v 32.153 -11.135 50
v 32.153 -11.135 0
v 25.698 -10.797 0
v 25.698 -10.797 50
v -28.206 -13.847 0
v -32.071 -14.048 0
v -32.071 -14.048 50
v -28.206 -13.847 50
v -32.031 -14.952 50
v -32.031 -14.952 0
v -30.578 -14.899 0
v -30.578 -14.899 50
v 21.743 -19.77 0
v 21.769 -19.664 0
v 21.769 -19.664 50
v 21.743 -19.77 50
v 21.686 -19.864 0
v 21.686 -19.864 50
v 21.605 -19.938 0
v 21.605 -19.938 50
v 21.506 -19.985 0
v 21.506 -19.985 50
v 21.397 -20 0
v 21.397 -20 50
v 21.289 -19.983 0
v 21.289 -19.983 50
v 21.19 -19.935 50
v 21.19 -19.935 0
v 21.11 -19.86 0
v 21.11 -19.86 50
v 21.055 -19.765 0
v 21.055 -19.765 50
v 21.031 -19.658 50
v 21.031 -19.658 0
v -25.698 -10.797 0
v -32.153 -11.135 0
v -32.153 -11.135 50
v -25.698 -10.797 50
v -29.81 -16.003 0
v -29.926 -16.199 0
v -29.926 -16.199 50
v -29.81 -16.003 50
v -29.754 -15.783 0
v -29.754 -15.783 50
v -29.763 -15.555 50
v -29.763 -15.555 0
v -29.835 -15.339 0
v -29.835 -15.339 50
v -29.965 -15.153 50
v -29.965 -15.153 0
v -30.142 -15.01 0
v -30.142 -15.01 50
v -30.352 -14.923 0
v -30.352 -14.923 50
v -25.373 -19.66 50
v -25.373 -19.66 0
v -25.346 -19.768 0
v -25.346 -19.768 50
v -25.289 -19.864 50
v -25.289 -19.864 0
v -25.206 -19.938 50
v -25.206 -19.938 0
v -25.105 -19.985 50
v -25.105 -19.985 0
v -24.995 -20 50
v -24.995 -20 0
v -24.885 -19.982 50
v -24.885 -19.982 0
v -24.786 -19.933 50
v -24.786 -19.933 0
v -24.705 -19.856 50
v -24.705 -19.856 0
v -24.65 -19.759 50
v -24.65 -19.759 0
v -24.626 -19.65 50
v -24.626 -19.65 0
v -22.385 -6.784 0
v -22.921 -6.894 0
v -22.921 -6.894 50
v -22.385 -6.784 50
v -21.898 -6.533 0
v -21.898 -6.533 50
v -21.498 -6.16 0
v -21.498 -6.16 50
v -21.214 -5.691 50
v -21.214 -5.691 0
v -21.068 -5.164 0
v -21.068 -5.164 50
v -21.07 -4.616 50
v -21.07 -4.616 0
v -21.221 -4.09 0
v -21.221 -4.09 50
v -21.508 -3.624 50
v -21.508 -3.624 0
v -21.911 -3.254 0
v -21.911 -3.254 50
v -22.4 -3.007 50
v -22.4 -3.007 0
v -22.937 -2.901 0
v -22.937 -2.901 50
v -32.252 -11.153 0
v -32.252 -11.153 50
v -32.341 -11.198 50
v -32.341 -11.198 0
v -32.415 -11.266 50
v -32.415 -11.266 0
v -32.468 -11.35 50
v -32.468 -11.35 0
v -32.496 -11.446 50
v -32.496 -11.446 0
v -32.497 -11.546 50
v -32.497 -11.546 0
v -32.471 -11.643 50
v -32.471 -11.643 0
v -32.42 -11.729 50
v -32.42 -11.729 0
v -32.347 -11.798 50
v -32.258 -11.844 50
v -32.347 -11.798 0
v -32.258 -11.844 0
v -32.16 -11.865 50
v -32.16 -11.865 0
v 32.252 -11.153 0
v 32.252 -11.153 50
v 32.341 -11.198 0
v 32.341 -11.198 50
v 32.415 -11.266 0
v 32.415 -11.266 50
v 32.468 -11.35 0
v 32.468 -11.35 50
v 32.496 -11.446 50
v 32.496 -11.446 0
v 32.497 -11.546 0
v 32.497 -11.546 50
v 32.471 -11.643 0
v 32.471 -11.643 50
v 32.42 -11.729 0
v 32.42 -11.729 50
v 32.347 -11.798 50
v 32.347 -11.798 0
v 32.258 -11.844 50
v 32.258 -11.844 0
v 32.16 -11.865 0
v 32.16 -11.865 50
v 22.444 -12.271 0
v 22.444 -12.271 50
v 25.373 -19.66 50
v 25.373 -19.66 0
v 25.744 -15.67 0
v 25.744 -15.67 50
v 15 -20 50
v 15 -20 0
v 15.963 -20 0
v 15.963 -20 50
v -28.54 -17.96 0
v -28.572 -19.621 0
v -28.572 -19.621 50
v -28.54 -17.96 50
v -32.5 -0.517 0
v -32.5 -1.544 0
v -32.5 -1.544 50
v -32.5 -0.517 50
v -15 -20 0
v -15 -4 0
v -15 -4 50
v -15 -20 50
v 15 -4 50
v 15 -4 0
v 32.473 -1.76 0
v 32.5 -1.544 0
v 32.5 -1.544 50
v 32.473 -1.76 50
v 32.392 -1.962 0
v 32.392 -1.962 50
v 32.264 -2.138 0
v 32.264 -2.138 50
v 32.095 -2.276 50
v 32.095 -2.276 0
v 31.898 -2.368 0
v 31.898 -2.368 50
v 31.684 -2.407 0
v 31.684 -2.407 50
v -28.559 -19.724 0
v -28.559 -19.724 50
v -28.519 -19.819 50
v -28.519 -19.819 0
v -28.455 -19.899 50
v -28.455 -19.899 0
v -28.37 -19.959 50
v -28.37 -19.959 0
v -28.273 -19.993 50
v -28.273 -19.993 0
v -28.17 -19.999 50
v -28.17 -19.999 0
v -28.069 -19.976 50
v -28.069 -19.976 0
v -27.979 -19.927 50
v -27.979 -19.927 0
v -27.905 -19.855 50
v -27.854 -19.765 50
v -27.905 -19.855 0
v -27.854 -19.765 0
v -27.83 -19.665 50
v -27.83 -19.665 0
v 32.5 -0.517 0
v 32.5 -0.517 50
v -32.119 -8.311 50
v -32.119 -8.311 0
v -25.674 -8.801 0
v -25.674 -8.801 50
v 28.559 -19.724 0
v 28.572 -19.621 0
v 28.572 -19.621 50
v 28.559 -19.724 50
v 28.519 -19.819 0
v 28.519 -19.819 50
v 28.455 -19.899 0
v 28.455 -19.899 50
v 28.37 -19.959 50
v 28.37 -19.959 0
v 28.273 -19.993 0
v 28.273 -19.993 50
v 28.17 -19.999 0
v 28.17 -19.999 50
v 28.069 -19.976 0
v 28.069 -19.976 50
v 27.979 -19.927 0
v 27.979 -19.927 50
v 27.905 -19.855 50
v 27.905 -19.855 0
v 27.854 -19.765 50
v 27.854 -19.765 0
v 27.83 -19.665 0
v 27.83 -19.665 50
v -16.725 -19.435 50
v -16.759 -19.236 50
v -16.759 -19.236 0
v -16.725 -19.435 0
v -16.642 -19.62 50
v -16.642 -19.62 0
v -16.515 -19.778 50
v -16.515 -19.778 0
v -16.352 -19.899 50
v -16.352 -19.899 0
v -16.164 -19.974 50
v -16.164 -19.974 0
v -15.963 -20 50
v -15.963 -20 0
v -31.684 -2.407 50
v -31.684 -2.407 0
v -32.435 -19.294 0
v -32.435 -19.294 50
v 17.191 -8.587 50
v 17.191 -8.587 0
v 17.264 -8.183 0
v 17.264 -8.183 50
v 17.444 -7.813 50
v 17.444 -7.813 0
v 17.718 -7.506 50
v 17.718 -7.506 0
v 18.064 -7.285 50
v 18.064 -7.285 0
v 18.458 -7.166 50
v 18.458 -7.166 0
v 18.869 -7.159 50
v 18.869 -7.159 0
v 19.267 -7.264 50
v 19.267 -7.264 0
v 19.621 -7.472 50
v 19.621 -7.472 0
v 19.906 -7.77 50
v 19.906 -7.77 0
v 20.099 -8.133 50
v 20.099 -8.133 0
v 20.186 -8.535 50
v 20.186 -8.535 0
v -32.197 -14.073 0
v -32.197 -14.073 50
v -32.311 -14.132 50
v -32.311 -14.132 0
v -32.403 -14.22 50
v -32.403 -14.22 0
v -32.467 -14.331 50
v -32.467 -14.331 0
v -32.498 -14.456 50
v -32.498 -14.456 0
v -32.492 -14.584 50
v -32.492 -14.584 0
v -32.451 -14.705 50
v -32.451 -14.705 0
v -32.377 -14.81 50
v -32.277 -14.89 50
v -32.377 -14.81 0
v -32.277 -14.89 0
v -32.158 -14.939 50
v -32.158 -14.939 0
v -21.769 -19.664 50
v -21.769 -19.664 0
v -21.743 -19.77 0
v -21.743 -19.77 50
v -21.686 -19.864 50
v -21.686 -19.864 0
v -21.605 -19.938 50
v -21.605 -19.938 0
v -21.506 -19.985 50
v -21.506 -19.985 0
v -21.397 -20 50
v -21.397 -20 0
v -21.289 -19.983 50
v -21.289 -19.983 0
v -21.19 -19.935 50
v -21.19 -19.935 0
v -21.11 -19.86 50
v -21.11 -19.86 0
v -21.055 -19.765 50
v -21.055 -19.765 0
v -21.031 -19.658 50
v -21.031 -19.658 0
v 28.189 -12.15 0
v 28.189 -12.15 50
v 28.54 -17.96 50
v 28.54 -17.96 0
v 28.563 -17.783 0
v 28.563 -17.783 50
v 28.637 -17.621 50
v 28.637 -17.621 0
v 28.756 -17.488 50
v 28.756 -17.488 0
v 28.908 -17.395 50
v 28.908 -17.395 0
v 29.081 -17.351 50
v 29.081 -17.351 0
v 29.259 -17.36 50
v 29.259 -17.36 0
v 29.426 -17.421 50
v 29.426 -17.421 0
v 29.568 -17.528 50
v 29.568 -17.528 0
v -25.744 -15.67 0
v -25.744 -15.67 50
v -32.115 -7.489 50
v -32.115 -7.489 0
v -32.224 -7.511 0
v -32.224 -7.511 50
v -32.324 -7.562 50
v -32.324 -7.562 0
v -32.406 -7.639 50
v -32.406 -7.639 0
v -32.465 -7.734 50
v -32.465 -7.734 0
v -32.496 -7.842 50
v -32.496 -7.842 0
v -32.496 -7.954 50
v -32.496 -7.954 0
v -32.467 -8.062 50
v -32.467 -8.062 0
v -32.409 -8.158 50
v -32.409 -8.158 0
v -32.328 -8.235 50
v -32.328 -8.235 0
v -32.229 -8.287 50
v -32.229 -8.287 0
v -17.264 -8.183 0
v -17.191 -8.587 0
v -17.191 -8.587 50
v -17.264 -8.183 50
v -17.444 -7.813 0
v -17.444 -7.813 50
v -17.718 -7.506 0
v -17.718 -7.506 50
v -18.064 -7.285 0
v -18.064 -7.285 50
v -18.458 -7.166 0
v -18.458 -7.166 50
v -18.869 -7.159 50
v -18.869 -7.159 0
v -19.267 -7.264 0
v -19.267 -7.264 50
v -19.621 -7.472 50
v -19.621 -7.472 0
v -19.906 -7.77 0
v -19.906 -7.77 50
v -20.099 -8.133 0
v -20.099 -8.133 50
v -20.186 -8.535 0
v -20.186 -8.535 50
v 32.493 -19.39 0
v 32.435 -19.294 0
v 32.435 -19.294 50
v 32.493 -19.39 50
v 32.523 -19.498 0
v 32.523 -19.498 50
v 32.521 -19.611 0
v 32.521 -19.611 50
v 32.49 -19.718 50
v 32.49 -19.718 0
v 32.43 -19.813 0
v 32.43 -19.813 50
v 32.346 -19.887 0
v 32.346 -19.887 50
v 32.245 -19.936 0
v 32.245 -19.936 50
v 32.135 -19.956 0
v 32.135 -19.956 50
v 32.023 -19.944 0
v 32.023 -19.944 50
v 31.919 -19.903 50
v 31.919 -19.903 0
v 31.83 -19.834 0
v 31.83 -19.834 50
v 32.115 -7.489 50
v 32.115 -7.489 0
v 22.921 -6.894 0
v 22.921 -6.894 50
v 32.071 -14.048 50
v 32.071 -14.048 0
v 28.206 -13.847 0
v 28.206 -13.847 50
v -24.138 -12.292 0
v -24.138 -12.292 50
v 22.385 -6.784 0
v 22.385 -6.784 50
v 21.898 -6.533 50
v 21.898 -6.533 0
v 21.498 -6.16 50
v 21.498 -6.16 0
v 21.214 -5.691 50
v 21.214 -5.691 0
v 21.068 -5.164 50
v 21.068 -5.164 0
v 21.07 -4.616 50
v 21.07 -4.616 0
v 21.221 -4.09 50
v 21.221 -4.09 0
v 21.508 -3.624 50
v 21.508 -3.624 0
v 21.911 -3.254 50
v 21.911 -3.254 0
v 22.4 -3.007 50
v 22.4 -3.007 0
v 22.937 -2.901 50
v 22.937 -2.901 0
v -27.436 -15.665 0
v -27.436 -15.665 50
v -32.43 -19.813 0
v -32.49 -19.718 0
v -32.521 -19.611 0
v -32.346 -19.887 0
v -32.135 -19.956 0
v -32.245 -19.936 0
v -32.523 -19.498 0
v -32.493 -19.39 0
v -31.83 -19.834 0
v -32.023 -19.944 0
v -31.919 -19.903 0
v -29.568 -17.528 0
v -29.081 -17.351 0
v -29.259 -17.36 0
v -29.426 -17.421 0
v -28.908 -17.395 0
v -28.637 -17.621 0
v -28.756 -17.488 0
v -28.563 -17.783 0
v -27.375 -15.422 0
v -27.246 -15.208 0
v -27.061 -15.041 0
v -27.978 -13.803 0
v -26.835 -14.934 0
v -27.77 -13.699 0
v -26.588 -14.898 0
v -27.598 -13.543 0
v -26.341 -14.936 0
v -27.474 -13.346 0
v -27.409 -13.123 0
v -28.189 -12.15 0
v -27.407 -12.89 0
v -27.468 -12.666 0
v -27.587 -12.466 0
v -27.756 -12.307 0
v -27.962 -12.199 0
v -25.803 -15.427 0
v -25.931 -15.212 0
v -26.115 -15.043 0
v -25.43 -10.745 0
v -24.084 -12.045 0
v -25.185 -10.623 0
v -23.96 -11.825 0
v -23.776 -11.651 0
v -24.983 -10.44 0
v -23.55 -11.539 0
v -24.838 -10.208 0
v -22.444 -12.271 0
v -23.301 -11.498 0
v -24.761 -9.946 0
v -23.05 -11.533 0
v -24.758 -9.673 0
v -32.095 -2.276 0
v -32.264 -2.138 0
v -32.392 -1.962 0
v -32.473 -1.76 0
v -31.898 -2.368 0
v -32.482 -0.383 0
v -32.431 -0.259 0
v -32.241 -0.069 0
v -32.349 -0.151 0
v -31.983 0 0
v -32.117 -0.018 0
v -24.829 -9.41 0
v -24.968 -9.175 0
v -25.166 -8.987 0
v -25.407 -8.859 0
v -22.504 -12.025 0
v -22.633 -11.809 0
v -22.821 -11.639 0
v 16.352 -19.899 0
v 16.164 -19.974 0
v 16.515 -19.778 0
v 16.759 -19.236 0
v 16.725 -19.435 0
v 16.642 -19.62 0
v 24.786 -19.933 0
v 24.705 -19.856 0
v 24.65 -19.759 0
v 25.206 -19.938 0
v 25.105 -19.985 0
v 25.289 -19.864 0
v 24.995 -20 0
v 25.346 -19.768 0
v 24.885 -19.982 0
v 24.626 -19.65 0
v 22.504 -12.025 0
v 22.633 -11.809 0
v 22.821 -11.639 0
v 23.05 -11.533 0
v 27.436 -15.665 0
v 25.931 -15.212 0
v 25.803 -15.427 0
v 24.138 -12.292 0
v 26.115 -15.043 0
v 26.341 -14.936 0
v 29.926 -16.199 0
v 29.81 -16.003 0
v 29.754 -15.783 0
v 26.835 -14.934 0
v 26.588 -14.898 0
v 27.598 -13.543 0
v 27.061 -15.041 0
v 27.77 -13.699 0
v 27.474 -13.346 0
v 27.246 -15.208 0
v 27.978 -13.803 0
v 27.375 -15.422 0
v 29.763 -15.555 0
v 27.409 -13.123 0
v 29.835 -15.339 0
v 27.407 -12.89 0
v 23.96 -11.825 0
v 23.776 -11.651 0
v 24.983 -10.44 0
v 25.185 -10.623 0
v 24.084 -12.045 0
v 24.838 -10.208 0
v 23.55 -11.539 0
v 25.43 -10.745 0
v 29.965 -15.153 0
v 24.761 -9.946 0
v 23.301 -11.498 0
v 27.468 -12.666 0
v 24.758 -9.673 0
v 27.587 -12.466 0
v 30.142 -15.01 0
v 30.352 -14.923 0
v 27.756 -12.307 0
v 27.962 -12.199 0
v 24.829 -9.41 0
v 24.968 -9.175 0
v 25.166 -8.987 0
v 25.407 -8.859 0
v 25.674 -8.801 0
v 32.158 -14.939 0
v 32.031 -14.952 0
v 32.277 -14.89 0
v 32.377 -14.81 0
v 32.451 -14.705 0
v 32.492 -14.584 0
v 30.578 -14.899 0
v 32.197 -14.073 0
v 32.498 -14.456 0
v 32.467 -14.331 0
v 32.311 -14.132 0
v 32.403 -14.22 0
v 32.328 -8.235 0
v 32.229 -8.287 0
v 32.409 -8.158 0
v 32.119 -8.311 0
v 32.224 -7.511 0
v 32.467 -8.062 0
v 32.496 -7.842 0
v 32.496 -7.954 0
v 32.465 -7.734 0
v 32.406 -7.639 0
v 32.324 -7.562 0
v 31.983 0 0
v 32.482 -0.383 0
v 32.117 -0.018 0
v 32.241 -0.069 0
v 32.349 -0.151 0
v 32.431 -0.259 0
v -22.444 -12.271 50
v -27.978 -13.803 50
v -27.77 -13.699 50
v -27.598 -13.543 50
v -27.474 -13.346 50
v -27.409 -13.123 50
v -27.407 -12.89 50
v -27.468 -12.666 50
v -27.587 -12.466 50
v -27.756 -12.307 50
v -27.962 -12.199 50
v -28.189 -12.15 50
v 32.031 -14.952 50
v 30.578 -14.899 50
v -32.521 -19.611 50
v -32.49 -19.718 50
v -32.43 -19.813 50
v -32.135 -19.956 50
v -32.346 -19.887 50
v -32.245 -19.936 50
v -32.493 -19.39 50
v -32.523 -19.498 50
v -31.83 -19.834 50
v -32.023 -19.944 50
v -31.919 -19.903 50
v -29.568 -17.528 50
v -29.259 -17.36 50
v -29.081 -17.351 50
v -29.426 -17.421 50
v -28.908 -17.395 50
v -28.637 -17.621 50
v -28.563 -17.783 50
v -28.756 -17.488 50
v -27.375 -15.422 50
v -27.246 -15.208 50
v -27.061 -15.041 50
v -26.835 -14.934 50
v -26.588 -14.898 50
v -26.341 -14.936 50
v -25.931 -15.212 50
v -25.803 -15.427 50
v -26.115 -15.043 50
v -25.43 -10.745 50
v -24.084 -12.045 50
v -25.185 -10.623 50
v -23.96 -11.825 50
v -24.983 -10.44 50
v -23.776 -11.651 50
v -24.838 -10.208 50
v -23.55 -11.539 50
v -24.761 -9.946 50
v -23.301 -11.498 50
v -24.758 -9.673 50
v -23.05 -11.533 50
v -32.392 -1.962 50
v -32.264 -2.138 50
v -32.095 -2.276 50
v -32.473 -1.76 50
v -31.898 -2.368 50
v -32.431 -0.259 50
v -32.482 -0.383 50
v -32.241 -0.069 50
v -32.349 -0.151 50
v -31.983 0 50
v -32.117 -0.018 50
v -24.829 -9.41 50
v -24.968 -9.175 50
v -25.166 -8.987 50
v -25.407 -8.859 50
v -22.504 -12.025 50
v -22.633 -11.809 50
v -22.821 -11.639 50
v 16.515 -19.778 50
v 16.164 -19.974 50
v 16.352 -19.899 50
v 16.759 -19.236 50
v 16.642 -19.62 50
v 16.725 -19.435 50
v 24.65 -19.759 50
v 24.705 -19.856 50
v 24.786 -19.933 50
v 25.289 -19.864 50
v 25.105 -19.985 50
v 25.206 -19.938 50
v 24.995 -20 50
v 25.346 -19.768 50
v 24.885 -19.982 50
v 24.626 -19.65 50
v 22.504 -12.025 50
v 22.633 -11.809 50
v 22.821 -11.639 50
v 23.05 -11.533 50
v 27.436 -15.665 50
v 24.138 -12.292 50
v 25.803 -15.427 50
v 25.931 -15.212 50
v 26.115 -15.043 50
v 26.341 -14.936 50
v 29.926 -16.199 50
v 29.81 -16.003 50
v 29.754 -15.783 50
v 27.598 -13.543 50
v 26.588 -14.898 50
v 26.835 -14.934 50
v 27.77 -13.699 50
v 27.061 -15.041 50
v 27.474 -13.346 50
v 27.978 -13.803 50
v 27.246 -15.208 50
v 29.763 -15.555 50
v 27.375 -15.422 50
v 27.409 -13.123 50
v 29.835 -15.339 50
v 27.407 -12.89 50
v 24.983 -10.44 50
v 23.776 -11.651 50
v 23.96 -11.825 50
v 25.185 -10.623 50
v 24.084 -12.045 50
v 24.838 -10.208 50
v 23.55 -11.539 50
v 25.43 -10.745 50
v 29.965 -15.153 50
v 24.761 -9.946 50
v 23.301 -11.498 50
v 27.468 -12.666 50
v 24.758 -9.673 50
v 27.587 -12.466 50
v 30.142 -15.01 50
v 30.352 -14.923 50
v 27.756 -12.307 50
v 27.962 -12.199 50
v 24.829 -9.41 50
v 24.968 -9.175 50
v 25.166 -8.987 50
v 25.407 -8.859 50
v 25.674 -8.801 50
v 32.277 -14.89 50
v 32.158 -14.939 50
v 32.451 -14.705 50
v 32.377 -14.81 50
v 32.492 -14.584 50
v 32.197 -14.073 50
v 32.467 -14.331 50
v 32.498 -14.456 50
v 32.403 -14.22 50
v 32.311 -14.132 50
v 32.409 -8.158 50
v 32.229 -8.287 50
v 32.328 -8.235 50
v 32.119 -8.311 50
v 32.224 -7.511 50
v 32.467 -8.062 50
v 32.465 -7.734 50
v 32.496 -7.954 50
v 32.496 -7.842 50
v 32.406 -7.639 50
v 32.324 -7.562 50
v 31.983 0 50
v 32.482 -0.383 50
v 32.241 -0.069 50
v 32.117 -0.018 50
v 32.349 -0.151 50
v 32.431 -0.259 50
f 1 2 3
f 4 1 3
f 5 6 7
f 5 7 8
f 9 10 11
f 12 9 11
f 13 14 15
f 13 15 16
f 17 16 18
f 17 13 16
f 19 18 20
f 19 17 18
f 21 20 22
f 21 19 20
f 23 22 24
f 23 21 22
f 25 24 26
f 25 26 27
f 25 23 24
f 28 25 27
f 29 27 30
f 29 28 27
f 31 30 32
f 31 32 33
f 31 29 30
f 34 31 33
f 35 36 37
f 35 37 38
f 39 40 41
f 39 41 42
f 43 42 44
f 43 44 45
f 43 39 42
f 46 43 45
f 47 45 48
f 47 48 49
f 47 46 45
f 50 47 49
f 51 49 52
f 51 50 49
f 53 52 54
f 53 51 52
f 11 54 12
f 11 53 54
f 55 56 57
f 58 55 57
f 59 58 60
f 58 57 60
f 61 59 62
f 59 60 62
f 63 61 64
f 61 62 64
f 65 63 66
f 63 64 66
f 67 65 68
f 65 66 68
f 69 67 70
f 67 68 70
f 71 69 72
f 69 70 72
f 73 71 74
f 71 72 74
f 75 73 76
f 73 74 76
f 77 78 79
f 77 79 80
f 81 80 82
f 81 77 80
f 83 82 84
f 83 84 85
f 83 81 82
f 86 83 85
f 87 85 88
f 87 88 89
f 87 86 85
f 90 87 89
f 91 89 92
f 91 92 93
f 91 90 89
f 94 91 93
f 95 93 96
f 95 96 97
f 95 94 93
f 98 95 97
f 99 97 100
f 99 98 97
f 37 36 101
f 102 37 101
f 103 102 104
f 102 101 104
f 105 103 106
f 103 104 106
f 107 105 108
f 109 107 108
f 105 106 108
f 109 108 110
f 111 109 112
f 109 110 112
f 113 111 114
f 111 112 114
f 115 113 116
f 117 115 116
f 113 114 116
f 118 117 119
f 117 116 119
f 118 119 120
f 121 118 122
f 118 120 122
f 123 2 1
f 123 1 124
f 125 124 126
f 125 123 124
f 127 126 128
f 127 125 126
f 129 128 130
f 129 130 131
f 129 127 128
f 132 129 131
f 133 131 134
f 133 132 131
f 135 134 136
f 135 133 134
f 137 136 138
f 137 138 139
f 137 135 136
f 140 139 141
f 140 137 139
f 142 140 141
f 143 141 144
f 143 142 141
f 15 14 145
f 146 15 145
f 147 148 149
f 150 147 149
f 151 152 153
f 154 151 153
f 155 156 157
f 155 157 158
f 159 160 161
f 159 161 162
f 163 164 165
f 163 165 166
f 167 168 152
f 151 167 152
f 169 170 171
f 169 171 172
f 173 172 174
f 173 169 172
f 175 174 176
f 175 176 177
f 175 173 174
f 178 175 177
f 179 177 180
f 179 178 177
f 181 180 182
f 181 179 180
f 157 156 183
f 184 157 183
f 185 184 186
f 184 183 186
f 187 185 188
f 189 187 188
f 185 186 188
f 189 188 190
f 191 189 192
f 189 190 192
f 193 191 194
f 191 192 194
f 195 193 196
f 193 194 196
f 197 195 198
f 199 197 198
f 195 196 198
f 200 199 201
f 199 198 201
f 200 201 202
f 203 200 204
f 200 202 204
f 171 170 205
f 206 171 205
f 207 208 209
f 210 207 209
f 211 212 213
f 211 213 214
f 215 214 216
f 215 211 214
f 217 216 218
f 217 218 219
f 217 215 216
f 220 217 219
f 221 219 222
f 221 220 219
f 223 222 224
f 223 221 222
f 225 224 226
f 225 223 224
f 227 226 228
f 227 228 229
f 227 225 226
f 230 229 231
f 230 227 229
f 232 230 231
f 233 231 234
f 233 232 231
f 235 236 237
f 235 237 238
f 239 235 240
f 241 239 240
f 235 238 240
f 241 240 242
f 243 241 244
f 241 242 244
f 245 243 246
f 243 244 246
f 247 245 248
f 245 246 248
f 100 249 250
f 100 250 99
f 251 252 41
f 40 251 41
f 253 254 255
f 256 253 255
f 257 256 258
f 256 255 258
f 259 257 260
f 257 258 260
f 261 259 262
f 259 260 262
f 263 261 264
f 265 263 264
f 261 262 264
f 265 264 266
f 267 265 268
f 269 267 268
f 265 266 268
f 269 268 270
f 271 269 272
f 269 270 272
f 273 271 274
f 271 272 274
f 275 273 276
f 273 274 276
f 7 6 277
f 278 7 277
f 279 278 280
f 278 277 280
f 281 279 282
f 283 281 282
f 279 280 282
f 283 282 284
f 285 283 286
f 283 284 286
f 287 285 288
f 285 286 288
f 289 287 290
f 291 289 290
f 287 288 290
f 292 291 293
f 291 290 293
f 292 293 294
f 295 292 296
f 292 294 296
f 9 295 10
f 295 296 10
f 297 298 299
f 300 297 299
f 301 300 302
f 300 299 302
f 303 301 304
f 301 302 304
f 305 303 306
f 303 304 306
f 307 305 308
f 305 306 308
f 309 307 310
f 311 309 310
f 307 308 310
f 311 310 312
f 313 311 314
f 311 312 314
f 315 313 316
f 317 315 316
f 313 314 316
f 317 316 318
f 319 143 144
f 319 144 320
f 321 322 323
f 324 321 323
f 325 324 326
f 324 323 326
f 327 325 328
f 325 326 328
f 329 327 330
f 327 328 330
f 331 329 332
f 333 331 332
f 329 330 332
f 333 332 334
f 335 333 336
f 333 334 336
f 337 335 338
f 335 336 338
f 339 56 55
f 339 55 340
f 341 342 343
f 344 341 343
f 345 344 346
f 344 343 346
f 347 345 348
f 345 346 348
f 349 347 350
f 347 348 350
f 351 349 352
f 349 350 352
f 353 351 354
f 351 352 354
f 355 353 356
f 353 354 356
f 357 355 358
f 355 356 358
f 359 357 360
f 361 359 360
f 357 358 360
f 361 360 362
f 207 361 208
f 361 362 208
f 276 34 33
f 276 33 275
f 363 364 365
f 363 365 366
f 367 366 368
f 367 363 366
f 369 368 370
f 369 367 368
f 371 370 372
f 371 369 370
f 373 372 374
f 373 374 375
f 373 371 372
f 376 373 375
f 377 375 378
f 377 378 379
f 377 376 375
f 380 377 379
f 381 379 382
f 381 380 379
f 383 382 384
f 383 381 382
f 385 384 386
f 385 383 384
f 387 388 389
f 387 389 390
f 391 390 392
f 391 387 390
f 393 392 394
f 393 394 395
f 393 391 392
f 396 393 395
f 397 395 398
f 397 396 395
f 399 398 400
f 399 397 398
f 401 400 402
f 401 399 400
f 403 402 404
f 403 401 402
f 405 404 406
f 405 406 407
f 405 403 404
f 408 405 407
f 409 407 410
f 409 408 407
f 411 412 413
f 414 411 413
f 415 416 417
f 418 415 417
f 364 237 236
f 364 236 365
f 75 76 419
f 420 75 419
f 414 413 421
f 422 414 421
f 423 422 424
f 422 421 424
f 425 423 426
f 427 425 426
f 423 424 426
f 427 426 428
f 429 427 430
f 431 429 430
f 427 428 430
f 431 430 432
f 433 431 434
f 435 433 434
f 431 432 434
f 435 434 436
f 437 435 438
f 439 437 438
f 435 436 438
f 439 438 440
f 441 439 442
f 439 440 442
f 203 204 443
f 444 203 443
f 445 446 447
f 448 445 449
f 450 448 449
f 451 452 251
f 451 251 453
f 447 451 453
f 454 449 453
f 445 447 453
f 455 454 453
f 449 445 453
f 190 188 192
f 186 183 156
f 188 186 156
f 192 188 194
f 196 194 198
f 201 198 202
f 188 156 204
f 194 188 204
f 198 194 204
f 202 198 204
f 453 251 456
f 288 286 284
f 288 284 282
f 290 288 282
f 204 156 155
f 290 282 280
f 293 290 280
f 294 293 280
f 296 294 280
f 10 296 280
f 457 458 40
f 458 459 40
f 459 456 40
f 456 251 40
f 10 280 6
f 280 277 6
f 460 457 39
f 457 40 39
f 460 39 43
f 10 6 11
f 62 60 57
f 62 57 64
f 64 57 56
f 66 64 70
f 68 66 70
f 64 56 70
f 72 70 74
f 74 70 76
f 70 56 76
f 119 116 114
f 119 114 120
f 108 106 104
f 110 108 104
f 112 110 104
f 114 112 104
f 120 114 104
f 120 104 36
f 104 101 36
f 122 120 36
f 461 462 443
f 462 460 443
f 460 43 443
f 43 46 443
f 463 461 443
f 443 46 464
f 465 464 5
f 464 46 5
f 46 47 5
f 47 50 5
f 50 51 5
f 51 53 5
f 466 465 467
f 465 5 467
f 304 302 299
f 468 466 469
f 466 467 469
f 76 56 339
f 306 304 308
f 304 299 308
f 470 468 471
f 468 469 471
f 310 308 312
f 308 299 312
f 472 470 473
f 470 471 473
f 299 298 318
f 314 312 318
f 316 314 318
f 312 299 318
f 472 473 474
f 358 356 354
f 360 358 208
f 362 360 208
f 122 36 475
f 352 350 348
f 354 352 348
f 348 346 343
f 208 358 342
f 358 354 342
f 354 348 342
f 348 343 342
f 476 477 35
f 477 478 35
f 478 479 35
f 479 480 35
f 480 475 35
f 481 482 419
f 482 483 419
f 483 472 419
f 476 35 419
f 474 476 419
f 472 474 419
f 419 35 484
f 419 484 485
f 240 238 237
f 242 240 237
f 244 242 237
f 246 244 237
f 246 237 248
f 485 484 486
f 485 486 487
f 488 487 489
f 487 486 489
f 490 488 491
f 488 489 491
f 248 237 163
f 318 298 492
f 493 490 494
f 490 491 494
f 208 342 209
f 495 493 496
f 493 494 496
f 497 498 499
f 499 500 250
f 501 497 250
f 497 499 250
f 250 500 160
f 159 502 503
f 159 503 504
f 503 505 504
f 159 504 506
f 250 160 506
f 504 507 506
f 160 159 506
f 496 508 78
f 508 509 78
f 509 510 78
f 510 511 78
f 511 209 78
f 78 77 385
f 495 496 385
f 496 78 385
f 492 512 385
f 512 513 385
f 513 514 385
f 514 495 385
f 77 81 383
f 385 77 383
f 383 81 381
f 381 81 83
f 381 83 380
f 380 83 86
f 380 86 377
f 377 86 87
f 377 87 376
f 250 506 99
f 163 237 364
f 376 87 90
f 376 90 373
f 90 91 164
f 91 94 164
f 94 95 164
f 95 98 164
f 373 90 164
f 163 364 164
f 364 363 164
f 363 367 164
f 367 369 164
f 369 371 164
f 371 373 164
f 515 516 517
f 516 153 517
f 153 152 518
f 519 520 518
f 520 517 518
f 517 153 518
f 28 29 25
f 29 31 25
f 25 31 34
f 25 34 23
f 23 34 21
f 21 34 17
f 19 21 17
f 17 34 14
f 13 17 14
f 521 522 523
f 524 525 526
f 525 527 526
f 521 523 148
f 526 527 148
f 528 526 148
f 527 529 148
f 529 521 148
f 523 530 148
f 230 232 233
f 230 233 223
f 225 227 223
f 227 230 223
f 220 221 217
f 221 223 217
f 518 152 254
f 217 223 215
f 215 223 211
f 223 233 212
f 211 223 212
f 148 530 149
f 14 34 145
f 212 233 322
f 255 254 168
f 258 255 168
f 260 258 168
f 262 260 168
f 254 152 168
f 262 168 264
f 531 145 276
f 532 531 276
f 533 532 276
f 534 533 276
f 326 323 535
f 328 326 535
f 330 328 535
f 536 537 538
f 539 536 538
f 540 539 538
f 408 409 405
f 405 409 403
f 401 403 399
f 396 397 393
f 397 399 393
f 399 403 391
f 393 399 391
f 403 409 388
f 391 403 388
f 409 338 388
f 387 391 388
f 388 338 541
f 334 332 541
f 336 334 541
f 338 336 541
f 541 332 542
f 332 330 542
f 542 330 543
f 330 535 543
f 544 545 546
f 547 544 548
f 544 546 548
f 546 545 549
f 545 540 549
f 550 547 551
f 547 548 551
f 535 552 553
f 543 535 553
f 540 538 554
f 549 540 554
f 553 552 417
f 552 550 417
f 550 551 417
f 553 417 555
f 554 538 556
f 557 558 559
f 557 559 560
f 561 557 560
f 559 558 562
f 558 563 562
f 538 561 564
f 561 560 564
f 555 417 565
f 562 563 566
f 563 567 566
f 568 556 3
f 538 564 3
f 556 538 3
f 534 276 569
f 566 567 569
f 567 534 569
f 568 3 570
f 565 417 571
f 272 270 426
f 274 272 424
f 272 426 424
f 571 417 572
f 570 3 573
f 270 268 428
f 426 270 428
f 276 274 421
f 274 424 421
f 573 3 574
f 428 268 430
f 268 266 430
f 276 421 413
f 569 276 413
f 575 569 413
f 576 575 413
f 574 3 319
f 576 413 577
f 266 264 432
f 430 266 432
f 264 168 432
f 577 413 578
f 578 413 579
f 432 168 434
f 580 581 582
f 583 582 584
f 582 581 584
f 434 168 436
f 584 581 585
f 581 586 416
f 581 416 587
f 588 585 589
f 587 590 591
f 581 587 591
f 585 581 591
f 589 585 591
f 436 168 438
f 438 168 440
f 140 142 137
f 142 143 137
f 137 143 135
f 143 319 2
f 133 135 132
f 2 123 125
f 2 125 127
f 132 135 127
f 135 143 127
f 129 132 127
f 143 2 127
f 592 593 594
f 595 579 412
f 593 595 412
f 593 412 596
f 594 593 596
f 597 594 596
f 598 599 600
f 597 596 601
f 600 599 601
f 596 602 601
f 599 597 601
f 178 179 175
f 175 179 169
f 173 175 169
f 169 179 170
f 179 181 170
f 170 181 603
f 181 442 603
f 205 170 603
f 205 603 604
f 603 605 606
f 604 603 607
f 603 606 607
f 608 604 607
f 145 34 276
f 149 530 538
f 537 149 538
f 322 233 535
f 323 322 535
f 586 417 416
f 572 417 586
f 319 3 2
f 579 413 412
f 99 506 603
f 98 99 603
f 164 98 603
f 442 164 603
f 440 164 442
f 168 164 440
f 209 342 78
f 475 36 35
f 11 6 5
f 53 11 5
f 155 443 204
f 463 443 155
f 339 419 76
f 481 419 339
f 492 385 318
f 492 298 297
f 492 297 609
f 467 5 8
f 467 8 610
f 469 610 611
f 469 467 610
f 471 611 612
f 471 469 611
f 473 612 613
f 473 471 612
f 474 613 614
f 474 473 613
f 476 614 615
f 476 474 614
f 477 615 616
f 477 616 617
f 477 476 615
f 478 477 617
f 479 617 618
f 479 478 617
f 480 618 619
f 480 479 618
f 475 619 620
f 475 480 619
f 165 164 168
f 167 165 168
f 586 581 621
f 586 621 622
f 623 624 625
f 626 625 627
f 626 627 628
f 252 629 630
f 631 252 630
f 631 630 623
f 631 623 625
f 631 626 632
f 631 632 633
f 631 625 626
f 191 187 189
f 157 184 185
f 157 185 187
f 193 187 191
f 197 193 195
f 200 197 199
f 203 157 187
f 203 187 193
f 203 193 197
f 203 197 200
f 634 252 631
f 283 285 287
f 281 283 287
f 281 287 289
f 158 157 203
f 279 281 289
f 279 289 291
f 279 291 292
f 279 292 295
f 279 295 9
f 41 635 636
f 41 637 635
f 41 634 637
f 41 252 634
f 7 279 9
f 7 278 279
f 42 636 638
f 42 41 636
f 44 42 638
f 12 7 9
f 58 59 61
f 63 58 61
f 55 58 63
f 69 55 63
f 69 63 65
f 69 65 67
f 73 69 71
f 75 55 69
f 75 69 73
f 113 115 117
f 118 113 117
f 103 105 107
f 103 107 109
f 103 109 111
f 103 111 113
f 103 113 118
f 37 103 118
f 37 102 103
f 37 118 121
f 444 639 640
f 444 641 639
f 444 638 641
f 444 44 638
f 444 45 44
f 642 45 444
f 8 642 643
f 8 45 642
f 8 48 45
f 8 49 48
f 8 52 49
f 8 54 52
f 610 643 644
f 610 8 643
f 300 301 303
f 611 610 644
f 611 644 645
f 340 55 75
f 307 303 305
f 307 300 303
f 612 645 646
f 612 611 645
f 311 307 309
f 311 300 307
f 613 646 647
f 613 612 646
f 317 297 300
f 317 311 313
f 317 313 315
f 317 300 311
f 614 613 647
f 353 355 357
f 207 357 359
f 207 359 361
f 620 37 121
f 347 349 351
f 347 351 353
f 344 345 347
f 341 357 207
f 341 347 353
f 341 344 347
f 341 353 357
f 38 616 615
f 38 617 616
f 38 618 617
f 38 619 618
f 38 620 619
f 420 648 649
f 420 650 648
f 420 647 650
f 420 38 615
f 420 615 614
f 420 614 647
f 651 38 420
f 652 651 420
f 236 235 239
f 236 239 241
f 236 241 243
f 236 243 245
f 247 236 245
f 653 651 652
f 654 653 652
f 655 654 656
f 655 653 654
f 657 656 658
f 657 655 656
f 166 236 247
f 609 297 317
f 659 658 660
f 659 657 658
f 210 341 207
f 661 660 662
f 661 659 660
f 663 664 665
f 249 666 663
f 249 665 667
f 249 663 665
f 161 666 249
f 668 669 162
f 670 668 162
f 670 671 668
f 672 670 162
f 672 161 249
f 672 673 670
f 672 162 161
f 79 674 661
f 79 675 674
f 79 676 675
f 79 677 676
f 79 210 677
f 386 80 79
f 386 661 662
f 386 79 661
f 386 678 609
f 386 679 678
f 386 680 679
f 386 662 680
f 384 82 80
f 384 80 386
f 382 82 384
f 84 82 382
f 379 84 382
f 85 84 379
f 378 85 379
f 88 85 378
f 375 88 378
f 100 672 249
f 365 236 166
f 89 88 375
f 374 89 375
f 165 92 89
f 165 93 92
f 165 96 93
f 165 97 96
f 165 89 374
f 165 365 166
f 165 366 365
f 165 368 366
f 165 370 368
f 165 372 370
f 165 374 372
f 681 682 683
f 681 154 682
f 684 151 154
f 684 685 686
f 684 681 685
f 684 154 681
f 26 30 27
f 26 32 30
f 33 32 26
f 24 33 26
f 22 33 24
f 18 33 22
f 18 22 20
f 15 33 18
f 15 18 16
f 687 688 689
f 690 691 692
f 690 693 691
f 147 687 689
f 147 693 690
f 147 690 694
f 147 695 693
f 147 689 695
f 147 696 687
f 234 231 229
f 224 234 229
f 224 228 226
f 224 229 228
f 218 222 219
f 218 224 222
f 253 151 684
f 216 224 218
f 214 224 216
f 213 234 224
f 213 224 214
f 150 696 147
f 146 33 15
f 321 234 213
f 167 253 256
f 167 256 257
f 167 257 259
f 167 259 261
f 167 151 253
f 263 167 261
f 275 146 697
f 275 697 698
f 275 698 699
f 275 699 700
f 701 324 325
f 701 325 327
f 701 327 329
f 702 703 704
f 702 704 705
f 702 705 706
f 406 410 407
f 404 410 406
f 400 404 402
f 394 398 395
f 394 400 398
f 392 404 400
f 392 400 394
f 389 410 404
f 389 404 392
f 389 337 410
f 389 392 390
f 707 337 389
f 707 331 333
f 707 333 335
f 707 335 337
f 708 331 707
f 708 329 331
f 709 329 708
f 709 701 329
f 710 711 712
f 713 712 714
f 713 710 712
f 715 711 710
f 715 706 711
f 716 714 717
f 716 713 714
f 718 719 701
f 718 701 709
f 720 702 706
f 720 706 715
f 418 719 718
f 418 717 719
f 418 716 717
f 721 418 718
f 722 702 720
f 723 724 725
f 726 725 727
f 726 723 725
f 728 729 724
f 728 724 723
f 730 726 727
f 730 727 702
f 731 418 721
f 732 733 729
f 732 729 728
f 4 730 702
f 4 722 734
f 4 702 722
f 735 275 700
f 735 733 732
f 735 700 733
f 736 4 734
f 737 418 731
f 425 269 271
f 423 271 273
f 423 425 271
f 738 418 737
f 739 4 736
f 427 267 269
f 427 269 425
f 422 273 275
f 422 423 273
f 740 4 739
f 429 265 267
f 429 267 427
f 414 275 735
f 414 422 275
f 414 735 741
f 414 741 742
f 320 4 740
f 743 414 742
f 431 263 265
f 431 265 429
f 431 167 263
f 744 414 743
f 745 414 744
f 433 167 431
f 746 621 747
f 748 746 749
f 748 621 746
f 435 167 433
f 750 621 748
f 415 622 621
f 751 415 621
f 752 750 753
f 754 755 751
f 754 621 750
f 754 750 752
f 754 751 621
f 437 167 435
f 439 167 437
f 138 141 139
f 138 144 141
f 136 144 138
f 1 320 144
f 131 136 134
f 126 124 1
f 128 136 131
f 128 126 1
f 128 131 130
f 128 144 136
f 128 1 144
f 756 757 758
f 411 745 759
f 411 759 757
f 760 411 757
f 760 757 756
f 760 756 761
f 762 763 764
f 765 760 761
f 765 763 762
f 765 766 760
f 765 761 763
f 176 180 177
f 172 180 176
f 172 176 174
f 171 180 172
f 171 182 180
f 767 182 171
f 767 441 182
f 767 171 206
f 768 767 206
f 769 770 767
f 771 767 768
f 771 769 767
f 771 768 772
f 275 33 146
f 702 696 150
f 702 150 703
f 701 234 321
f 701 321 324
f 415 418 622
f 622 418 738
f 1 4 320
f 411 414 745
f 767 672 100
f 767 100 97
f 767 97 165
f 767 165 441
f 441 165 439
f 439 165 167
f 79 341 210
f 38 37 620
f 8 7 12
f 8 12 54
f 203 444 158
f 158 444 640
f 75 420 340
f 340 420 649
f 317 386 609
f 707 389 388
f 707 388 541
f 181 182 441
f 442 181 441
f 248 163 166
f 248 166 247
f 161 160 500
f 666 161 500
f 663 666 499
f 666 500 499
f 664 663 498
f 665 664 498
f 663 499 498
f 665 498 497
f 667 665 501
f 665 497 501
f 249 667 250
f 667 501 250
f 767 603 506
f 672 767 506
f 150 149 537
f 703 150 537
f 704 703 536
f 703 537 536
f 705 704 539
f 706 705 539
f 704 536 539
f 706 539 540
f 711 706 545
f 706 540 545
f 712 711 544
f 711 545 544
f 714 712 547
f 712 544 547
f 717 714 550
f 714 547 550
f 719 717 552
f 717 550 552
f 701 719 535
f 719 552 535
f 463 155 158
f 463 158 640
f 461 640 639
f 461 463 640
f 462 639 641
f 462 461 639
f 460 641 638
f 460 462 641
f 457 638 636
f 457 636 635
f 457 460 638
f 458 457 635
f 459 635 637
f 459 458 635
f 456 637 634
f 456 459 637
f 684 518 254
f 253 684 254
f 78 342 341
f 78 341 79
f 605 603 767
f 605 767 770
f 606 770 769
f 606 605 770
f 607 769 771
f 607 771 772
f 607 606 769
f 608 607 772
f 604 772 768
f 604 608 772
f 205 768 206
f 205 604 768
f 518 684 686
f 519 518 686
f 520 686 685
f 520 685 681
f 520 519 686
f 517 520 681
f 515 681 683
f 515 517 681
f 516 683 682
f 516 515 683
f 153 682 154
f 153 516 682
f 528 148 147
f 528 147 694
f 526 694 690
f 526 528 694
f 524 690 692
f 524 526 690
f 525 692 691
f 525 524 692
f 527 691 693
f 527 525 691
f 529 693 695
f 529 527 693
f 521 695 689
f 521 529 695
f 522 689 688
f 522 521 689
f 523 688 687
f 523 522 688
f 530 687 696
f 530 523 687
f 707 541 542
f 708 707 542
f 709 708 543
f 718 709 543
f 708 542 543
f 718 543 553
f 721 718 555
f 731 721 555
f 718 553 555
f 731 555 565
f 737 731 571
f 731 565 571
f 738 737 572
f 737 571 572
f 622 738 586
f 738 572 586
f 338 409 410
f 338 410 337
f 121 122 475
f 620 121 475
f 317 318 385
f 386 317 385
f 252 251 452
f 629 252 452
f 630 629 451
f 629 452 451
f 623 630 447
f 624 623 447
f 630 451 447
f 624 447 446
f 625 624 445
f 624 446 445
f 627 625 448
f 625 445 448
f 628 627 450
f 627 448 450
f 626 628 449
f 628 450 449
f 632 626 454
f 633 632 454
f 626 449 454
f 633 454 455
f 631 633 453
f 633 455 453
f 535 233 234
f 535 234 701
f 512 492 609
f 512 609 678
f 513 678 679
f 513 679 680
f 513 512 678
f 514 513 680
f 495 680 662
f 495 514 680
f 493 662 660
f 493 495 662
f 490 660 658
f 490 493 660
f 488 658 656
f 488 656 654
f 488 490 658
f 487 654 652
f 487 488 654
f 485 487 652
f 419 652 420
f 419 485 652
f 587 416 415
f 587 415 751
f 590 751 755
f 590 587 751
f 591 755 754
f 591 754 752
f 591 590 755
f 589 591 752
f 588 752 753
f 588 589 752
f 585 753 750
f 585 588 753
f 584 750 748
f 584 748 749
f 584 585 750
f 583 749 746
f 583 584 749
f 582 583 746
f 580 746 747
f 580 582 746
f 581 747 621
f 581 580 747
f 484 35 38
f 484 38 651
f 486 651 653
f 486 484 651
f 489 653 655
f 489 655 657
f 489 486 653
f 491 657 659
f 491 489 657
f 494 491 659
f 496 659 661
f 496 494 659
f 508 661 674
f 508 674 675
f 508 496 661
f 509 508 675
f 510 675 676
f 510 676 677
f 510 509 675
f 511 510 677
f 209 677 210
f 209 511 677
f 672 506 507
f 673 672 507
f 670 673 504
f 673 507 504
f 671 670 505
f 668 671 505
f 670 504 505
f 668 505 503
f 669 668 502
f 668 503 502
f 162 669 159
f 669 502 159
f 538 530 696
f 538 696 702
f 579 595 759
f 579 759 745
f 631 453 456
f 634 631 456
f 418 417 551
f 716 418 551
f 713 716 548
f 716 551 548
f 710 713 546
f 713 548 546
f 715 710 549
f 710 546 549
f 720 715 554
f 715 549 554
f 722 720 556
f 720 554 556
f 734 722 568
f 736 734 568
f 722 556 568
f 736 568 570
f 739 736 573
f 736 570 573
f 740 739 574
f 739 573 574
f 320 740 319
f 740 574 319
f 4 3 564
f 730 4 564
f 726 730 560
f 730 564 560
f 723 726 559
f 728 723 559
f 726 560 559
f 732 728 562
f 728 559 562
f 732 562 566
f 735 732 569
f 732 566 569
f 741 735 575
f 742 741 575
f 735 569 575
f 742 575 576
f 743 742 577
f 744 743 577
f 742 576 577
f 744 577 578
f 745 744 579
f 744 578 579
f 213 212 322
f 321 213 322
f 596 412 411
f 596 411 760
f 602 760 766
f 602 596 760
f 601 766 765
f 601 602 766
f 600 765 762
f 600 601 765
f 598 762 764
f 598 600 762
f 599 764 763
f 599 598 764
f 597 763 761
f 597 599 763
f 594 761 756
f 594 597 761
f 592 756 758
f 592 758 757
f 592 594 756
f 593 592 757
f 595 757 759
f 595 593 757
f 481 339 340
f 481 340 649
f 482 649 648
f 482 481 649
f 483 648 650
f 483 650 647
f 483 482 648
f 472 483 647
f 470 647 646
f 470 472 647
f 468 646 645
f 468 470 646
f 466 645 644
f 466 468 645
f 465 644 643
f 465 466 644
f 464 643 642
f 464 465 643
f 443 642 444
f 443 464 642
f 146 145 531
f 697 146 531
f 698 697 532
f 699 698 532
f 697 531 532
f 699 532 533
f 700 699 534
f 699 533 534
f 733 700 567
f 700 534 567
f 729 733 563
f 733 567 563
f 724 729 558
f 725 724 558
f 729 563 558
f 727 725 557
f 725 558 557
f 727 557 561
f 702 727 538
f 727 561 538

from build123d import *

# Parameters (mm, degrees)
PAD_DEPTH = 50


with BuildPart() as part:
    # Sketch → Pad (new body)
    with BuildSketch(Plane.XY):
        with BuildLine():
            Line((0, 0), (0, -4))
            Line((0, -4), (-15, -4))
            Line((-15, -4), (-15, -20))
            Line((-15, -20), (-15.962702, -20))
            ThreePointArc((-16.758832, -19.235543), (-16.514566, -19.777943), (-15.962702, -20))
            Line((-16.758832, -19.235543), (-17.191233, -8.587361))
            ThreePointArc((-17.191233, -8.587361), (-18.663554, -7.148457), (-20.185686, -8.534564))
            Line((-21.030971, -19.657951), (-20.185686, -8.534564))
            ThreePointArc((-21.76856, -19.663558), (-21.397187, -19.999989), (-21.030971, -19.657951))
            Line((-21.76856, -19.663558), (-22.443519, -12.270938))
            ThreePointArc((-22.443519, -12.270938), (-23.300533, -11.498289), (-24.138133, -12.291944))
            Line((-24.626417, -19.650386), (-24.138133, -12.291944))
            ThreePointArc((-25.372798, -19.660239), (-24.995058, -19.999967), (-24.626417, -19.650386))
            Line((-25.372798, -19.660239), (-25.743648, -15.669538))
            ThreePointArc((-25.743648, -15.669538), (-26.587631, -14.898227), (-27.435897, -15.664825))
            Line((-27.830084, -19.664747), (-27.435897, -15.664825))
            ThreePointArc((-28.571641, -19.621239), (-28.221771, -19.999362), (-27.830084, -19.664747))
            Line((-28.571641, -19.621239), (-28.540106, -17.959608))
            ThreePointArc((-28.540106, -17.959608), (-28.907829, -17.394963), (-29.568372, -17.528109))
            Line((-31.830105, -19.834306), (-29.568372, -17.528109))
            ThreePointArc((-32.435415, -19.2943), (-32.390304, -19.852993), (-31.830105, -19.834306))
            Line((-32.435415, -19.2943), (-29.926108, -16.198984))
            ThreePointArc((-29.926108, -16.198984), (-29.834934, -15.3395), (-30.578403, -14.898728))
            Line((-32.030902, -14.952159), (-30.578403, -14.898728))
            ThreePointArc((-32.071041, -14.048146), (-32.499555, -14.52007), (-32.030902, -14.952159))
            Line((-32.071041, -14.048146), (-28.20584, -13.847076))
            ThreePointArc((-28.20584, -13.847076), (-27.40004, -13.006636), (-28.189047, -12.150411))
            Line((-32.160387, -11.864905), (-28.189047, -12.150411))
            ThreePointArc((-32.153271, -11.134653), (-32.499983, -11.496435), (-32.160387, -11.864905))
            Line((-32.153271, -11.134653), (-25.697743, -10.796857))
            ThreePointArc((-25.697743, -10.796857), (-24.750068, -9.810055), (-25.674128, -8.801106))
            Line((-32.119375, -8.310687), (-25.674128, -8.801106))
            ThreePointArc((-32.114723, -7.488986), (-32.499993, -7.897668), (-32.119375, -8.310687))
            Line((-32.114723, -7.488986), (-22.920848, -6.894049))
            ThreePointArc((-22.920848, -6.894049), (-21.050015, -4.89004), (-22.937185, -2.901408))
            Line((-31.68374, -2.407258), (-22.937185, -2.901408))
            ThreePointArc((-32.5, -1.543581), (-32.263646, -2.137765), (-31.68374, -2.407258))
            Line((-32.5, -1.543581), (-32.5, -0.517038))
            ThreePointArc((-31.982962, 0), (-32.348563, -0.151437), (-32.5, -0.517038))
            Line((-31.982962, 0), (0, 0))
        make_face()
    pad = extrude(amount=PAD_DEPTH)

    # Mirrored: Pad across Sketch V_Axis
    add(pad.mirror(Plane(origin=(0, 0, 0), x_dir=(0, 0, 1), z_dir=(1, 0, 0))))


solid = part.part
